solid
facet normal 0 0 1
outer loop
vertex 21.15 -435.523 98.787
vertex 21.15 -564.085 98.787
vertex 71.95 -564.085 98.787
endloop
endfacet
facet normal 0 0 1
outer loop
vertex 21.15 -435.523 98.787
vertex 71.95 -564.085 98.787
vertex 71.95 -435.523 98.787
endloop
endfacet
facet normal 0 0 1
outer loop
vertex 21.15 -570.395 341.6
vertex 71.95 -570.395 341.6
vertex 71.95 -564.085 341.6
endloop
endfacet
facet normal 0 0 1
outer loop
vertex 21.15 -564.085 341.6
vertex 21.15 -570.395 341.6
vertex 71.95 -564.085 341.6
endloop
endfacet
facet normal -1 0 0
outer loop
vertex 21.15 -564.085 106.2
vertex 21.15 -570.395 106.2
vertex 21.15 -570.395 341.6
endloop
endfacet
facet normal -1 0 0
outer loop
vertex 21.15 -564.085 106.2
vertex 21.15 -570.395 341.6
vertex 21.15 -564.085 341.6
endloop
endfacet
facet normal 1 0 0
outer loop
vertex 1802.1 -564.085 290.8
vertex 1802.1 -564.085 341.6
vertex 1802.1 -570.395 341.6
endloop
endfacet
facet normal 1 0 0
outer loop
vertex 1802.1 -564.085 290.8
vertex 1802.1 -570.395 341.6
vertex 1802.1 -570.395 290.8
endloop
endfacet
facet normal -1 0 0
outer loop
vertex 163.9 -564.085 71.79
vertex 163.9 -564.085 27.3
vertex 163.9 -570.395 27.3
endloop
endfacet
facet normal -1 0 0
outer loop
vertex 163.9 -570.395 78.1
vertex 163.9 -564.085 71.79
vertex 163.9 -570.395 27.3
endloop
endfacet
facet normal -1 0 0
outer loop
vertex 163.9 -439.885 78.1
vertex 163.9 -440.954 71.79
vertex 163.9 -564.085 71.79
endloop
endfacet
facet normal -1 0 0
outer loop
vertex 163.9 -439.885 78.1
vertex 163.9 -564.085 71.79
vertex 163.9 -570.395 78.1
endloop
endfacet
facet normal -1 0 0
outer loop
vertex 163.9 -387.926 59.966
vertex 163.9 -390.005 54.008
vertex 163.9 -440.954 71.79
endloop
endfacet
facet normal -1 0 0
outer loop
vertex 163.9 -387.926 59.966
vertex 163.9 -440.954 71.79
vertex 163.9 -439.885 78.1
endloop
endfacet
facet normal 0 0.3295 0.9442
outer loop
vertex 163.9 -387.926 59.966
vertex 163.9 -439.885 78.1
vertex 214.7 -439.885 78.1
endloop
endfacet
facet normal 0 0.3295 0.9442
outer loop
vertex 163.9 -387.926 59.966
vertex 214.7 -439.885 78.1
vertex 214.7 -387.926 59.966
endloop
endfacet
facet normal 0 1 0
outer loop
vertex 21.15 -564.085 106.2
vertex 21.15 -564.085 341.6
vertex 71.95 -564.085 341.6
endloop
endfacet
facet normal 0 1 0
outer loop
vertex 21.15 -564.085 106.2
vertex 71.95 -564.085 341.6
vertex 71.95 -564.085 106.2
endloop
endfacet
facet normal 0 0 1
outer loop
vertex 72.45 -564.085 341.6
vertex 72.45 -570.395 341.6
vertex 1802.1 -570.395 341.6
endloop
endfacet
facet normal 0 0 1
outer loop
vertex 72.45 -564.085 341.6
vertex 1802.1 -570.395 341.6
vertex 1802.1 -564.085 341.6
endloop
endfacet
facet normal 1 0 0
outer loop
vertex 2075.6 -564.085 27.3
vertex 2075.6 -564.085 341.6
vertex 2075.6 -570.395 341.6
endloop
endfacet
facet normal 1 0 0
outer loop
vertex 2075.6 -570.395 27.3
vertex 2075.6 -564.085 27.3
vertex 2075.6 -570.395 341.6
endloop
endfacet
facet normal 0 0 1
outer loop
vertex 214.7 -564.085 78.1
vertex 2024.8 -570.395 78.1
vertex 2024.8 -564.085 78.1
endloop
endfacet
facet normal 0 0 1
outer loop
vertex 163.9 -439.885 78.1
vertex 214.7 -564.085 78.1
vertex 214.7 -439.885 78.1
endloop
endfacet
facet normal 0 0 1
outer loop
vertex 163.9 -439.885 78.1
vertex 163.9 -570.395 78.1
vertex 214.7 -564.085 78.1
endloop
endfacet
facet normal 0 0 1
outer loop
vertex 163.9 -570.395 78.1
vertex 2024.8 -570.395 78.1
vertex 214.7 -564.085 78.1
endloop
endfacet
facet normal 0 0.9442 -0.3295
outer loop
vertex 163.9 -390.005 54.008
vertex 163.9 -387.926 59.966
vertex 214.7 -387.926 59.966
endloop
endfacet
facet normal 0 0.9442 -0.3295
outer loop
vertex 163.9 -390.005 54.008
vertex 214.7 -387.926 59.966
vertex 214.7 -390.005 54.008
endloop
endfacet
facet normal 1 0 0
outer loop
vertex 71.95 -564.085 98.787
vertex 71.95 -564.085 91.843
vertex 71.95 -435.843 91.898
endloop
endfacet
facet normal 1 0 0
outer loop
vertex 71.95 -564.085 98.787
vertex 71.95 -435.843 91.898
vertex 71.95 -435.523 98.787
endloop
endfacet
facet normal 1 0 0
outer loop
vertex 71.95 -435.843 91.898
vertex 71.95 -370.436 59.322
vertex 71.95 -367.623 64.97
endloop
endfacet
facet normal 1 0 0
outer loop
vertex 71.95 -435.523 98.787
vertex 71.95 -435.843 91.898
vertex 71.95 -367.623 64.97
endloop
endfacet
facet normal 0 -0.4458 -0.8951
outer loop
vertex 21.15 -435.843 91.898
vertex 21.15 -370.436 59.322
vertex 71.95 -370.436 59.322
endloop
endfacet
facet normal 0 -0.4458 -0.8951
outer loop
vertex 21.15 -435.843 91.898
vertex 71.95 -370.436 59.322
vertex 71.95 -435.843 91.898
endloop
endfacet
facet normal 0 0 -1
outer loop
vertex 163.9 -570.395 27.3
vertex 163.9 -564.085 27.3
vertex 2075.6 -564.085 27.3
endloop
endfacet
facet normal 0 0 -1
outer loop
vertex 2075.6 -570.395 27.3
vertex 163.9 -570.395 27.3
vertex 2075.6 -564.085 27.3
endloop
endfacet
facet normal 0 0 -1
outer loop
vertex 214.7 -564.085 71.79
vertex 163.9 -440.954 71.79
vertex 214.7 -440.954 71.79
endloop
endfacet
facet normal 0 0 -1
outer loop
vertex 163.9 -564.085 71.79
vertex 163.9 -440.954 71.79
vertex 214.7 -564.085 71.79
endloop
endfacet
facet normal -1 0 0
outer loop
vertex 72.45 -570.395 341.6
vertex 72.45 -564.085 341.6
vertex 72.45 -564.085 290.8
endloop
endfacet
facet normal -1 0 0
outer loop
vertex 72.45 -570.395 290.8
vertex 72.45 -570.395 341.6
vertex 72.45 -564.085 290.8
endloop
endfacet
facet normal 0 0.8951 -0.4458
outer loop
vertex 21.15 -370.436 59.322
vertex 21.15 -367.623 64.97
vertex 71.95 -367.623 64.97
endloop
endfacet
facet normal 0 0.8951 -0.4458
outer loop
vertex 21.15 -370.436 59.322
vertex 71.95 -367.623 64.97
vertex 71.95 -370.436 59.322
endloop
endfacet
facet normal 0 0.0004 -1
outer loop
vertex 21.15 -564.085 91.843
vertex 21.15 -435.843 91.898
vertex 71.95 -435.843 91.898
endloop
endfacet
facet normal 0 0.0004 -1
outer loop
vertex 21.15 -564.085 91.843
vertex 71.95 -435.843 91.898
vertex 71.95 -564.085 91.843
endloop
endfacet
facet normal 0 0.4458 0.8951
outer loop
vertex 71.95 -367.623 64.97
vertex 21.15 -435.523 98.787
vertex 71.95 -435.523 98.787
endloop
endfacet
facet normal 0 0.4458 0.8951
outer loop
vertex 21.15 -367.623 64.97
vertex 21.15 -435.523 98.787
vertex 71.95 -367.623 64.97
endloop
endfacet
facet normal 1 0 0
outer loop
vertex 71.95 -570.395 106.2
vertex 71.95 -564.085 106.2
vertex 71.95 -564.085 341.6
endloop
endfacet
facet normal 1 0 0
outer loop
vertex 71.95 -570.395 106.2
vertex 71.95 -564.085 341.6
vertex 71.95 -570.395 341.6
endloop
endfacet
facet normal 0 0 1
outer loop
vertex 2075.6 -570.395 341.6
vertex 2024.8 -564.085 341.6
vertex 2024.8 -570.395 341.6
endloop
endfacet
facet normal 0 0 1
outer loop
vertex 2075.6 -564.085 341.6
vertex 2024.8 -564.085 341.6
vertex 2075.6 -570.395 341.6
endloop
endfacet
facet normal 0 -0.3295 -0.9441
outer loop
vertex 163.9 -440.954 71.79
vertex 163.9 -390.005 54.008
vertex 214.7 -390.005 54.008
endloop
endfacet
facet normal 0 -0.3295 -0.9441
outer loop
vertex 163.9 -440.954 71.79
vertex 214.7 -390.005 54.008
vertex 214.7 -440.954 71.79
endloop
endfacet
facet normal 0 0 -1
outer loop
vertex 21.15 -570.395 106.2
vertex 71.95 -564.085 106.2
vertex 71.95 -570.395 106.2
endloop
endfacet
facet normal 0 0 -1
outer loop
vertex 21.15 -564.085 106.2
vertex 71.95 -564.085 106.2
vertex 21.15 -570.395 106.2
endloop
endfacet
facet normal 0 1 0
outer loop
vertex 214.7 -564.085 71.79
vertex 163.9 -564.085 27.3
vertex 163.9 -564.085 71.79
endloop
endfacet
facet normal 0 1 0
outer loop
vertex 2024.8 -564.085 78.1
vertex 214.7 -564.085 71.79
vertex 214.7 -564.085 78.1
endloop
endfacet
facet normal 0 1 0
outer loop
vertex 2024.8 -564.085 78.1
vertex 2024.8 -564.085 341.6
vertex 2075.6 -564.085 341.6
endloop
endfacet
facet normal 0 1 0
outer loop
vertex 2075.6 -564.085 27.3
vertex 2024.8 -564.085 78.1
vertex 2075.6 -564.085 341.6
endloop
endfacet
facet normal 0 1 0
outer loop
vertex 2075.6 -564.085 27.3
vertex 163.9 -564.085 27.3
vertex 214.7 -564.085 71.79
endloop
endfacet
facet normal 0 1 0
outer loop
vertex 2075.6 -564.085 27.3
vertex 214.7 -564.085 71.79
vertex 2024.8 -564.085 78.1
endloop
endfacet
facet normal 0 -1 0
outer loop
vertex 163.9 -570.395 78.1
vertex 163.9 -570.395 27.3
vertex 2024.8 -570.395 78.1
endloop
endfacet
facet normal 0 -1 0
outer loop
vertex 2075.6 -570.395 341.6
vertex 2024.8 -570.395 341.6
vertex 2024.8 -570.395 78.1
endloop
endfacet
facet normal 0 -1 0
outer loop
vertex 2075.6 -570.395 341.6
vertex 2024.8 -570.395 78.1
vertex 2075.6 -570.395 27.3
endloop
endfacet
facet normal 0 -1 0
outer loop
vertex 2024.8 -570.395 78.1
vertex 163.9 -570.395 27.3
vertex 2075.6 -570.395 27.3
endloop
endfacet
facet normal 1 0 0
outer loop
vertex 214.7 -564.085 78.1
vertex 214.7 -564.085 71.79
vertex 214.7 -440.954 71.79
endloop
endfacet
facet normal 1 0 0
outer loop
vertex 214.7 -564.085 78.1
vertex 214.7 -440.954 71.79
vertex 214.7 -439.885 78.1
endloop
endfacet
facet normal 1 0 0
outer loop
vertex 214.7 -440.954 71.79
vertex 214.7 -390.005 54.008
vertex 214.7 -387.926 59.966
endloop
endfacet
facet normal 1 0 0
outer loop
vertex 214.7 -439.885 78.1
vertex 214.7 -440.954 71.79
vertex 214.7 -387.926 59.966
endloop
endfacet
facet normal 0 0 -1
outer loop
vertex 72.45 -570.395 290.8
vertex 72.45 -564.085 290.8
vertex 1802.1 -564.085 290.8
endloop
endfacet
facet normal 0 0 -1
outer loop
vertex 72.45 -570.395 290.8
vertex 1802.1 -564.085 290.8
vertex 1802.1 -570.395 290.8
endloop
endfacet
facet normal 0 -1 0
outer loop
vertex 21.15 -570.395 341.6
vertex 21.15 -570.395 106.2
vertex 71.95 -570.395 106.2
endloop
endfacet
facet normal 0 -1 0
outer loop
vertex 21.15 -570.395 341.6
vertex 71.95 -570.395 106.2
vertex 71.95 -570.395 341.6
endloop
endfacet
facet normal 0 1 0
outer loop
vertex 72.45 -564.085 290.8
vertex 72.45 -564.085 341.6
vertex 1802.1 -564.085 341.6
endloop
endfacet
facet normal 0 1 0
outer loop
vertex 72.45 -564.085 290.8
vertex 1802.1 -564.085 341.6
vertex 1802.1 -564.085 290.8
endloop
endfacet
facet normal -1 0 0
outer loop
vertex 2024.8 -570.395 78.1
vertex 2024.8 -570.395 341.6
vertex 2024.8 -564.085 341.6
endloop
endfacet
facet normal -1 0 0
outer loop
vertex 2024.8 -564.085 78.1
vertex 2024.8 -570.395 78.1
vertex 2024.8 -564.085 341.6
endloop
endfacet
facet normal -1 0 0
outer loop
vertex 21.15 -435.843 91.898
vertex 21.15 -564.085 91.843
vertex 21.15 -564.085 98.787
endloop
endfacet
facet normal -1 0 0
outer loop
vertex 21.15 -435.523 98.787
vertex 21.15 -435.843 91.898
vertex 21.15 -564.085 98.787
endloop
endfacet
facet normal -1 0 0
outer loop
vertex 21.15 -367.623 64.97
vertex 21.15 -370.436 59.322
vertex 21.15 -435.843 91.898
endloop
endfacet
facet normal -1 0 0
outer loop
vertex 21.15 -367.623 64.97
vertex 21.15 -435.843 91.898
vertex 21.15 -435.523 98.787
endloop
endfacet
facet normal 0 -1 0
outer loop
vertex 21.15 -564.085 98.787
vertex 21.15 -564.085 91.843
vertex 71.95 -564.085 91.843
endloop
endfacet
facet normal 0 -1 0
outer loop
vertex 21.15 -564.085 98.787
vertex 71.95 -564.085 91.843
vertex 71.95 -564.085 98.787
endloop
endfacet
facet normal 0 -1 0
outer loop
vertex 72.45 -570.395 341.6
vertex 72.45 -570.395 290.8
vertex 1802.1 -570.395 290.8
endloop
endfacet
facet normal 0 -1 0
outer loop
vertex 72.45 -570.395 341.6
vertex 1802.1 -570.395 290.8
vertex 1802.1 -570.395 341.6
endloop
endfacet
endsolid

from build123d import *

# Parameters (mm, degrees)
CROQUIS2_W              = 50.8
CROQUIS2_H              = 6.31
CROQUIS3_W              = 50.8
CROQUIS3_H              = 6.31
CROQUIS4_W              = 60
CROQUIS4_H              = 53.155
SALIENTE_EXTRUIR1_DEPTH = 6.31
CROQUIS5_W              = 60
CROQUIS5_H              = 6.31
CORTAR_EXTRUIR1_DEPTH   = 6.31
CORTAR_EXTRUIR2_DEPTH   = 502
CROQUIS8_W              = 50.8
CROQUIS8_H              = 564.085
CORTAR_EXTRUIR3_DEPTH   = 502
CROQUIS9_W              = 314.3
CROQUIS9_H              = 1090.402933
CORTAR_EXTRUIR4_DEPTH   = 502
CROQUIS10_W             = 50.8
CROQUIS10_H             = 6.31
CORTAR_EXTRUIR5_DEPTH   = 95
CORTAR_EXTRUIR6_DEPTH   = 95
CROQUIS13_W             = 120
CROQUIS13_H             = 249.755
CORTAR_EXTRUIR7_DEPTH   = 95
CROQUIS16_W             = 125
CROQUIS16_H             = 50.8
SALIENTE_EXTRUIR4_DEPTH = 6.31
CROQUIS17_W             = 50.8
CROQUIS17_H             = 6.31
SALIENTE_EXTRUIR5_DEPTH = 50.8
SALIENTE_EXTRUIR6_DEPTH = 50.8
CROQUIS21_W             = 10
CROQUIS21_H             = 50.8
CORTAR_EXTRUIR9_DEPTH   = 53
CROQUIS22_W             = 0.5
CROQUIS22_H             = 50.8
CORTAR_EXTRUIR10_DEPTH  = 10


with BuildPart() as part:
    # Barrer1: sweep along a curve in space
    with BuildLine() as barrer1_path:
        Line((0, 0, 0), (0, -567.24, 0))
        Line((0, -567.24, 0), (0, -567.24, 316.2))
        Line((0, -567.24, 316.2), (1786.7, -567.24, 316.2))
        Line((1786.7, -567.24, 316.2), (1786.7, -567.24, 578))
        Line((1786.7, -567.24, 578), (1786.7, -435.47278313, 578))
        Line((1786.7, -435.47278313, 578), (1786.7, -435.47278313, 1432.002933))
    # Croquis2 → Barrer1 (sweep)
    with BuildSketch(Plane(origin=(0, 0, 0), x_dir=(1, 0, 0), z_dir=(0, 1, 0))):
        Rectangle(CROQUIS2_W, CROQUIS2_H)
        with Locations((263.5, 0)):
            Rectangle(CROQUIS2_W, CROQUIS2_H)
    sweep(path=barrer1_path.line, transition=Transition.RIGHT)

    # Barrer4: sweep along a curve in space
    with BuildLine() as barrer4_path:
        Line((-0.201028049, -3.155, -3.155), (-0.201028049, -3.155, -207.155))
        Line((-0.201028049, -3.155, -207.155), (-0.201028049, -53.155, -207.155))
    # Croquis3 → Barrer4 (sweep)
    with BuildSketch(Plane(origin=(0, 0, -3.155), x_dir=(-1, 0, 0), z_dir=(0, 0, -1))):
        with Locations((-263.5, -3.155)):
            Rectangle(CROQUIS3_W, CROQUIS3_H)
        with Locations((0, -3.155)):
            Rectangle(CROQUIS3_W, CROQUIS3_H)
    sweep(path=barrer4_path.line, transition=Transition.RIGHT)

    # Croquis4 → Saliente-Extruir1 (add)
    with BuildSketch(Plane(origin=(0, 0, -210.31), x_dir=(-1, 0, 0), z_dir=(0, 0, -1))):
        with Locations((-208.1, -26.5775)):
            Rectangle(CROQUIS4_W, CROQUIS4_H)
    extrude(amount=-SALIENTE_EXTRUIR1_DEPTH)

    # Croquis5 → Cortar-Extruir1 (cut)
    with BuildSketch(Plane.XY.offset(-204)):
        with Locations((208.1, -3.155)):
            Rectangle(CROQUIS5_W, CROQUIS5_H)
    extrude(amount=-CORTAR_EXTRUIR1_DEPTH, mode=Mode.SUBTRACT)

    # Croquis7 → Cortar-Extruir2 (cut)
    with BuildSketch(Plane.XY.offset(3.155)):
        Polygon((288.9, -564.085), (238.1, -564.085), (238.1, -68.875540851), (170.611072112, -68.875540851), (170.611072112, 0), (288.9, 0), align=None)
    extrude(amount=-CORTAR_EXTRUIR2_DEPTH, mode=Mode.SUBTRACT)

    # Croquis8 → Cortar-Extruir3 (cut)
    with BuildSketch(Plane.XY.offset(3.155)):
        with Locations((0, -282.0425)):
            Rectangle(CROQUIS8_W, CROQUIS8_H)
    extrude(amount=-CORTAR_EXTRUIR3_DEPTH, mode=Mode.SUBTRACT)

    # Croquis9 → Cortar-Extruir4 (cut)
    with BuildSketch(Plane(origin=(0, -432.31778313, 0), x_dir=(1, 0, 0), z_dir=(0, 1, 0))):
        with Locations((1918.45, -886.8014665)):
            Rectangle(CROQUIS9_W, CROQUIS9_H)
    extrude(amount=-CORTAR_EXTRUIR4_DEPTH, mode=Mode.SUBTRACT)

    # Croquis10 → Cortar-Extruir5 (cut)
    with BuildSketch(Plane(origin=(0, 0, -3.155), x_dir=(-1, 0, 0), z_dir=(0, 0, -1))):
        with Locations((0, -567.24)):
            Rectangle(CROQUIS10_W, CROQUIS10_H)
    extrude(amount=-CORTAR_EXTRUIR5_DEPTH, mode=Mode.SUBTRACT)

    # Croquis11 → Cortar-Extruir6 (cut)
    with BuildSketch(Plane(origin=(0, -564.085, 0), x_dir=(1, 0, 0), z_dir=(0, 1, 0))):
        Polygon((238.1, -78.1), (288.9, -78.1), (288.9, -27.3), align=None)
        Polygon((238.1, -78.1), (288.9, -27.3), (238.1, -27.3), align=None)
        Polygon((238.1, -27.3), (288.9, -27.3), (288.9, -3.155), (288.9, 3.155), (238.1, 3.155), (238.1, -3.155), align=None)
    extrude(amount=-CORTAR_EXTRUIR6_DEPTH, mode=Mode.SUBTRACT)

    # Croquis13 → Cortar-Extruir7 (cut)
    with BuildSketch(Plane(origin=(0, -564.085, 0), x_dir=(1, 0, 0), z_dir=(0, 1, 0))):
        with Locations((34.6, -216.7225)):
            Rectangle(CROQUIS13_W, CROQUIS13_H)
    extrude(amount=-CORTAR_EXTRUIR7_DEPTH, mode=Mode.SUBTRACT)

    # Croquis16 → Saliente-Extruir4 (add)
    with BuildSketch(Plane(origin=(0, -564.085, 0), x_dir=(1, 0, 0), z_dir=(0, 1, 0))):
        with Locations((226.4, -52.7)):
            Rectangle(CROQUIS16_W, CROQUIS16_H)
    extrude(amount=-SALIENTE_EXTRUIR4_DEPTH)

    # Barrer5: sweep along a curve in space
    with BuildLine() as barrer5_path:
        Line((94.6, -567.24, 316.2), (46.55, -567.24, 316.2))
        Line((46.55, -567.24, 316.2), (46.55, -567.24, 106.2))
    # Croquis17 → Barrer5 (sweep)
    with BuildSketch(Plane.ZY.offset(-94.6)):
        with Locations((316.2, -567.24)):
            Rectangle(CROQUIS17_W, CROQUIS17_H)
    sweep(path=barrer5_path.line, transition=Transition.RIGHT)

    # Croquis20 → Saliente-Extruir6 (add)
    with BuildSketch(Plane.ZY.offset(-163.9)):
        Polygon((78.1, -564.085), (78.1, -439.884522326), (59.966060883, -387.925515276), (54.008468178, -390.004743297), (71.79, -440.954001003), (71.79, -564.085), align=None)
    extrude(amount=-SALIENTE_EXTRUIR6_DEPTH)

    # Croquis21 → Cortar-Extruir9 (cut)
    with BuildSketch(Plane(origin=(0, -564.085, 0), x_dir=(1, 0, 0), z_dir=(0, 1, 0))):
        with Locations((1807.1, -316.2)):
            Rectangle(CROQUIS21_W, CROQUIS21_H)
    extrude(amount=-CORTAR_EXTRUIR9_DEPTH, mode=Mode.SUBTRACT)

    # Croquis22 → Cortar-Extruir10 (cut)
    with BuildSketch(Plane(origin=(0, -564.085, 0), x_dir=(1, 0, 0), z_dir=(0, 1, 0))):
        with Locations((72.2, -316.2)):
            Rectangle(CROQUIS22_W, CROQUIS22_H)
    extrude(amount=-CORTAR_EXTRUIR10_DEPTH, mode=Mode.SUBTRACT)


with BuildPart() as body_2:
    # Croquis18 → Saliente-Extruir5 (new body)
    with BuildSketch(Plane.ZY.offset(-21.15)):
        Polygon((98.787204793, -564.085), (98.787204793, -435.522965931), (64.969988324, -367.622744457), (59.321737777, -370.435814978), (91.897545374, -435.843461779), (91.842933, -564.085), align=None)
    extrude(amount=-SALIENTE_EXTRUIR5_DEPTH)


solid = Compound([part.part, body_2.part])
